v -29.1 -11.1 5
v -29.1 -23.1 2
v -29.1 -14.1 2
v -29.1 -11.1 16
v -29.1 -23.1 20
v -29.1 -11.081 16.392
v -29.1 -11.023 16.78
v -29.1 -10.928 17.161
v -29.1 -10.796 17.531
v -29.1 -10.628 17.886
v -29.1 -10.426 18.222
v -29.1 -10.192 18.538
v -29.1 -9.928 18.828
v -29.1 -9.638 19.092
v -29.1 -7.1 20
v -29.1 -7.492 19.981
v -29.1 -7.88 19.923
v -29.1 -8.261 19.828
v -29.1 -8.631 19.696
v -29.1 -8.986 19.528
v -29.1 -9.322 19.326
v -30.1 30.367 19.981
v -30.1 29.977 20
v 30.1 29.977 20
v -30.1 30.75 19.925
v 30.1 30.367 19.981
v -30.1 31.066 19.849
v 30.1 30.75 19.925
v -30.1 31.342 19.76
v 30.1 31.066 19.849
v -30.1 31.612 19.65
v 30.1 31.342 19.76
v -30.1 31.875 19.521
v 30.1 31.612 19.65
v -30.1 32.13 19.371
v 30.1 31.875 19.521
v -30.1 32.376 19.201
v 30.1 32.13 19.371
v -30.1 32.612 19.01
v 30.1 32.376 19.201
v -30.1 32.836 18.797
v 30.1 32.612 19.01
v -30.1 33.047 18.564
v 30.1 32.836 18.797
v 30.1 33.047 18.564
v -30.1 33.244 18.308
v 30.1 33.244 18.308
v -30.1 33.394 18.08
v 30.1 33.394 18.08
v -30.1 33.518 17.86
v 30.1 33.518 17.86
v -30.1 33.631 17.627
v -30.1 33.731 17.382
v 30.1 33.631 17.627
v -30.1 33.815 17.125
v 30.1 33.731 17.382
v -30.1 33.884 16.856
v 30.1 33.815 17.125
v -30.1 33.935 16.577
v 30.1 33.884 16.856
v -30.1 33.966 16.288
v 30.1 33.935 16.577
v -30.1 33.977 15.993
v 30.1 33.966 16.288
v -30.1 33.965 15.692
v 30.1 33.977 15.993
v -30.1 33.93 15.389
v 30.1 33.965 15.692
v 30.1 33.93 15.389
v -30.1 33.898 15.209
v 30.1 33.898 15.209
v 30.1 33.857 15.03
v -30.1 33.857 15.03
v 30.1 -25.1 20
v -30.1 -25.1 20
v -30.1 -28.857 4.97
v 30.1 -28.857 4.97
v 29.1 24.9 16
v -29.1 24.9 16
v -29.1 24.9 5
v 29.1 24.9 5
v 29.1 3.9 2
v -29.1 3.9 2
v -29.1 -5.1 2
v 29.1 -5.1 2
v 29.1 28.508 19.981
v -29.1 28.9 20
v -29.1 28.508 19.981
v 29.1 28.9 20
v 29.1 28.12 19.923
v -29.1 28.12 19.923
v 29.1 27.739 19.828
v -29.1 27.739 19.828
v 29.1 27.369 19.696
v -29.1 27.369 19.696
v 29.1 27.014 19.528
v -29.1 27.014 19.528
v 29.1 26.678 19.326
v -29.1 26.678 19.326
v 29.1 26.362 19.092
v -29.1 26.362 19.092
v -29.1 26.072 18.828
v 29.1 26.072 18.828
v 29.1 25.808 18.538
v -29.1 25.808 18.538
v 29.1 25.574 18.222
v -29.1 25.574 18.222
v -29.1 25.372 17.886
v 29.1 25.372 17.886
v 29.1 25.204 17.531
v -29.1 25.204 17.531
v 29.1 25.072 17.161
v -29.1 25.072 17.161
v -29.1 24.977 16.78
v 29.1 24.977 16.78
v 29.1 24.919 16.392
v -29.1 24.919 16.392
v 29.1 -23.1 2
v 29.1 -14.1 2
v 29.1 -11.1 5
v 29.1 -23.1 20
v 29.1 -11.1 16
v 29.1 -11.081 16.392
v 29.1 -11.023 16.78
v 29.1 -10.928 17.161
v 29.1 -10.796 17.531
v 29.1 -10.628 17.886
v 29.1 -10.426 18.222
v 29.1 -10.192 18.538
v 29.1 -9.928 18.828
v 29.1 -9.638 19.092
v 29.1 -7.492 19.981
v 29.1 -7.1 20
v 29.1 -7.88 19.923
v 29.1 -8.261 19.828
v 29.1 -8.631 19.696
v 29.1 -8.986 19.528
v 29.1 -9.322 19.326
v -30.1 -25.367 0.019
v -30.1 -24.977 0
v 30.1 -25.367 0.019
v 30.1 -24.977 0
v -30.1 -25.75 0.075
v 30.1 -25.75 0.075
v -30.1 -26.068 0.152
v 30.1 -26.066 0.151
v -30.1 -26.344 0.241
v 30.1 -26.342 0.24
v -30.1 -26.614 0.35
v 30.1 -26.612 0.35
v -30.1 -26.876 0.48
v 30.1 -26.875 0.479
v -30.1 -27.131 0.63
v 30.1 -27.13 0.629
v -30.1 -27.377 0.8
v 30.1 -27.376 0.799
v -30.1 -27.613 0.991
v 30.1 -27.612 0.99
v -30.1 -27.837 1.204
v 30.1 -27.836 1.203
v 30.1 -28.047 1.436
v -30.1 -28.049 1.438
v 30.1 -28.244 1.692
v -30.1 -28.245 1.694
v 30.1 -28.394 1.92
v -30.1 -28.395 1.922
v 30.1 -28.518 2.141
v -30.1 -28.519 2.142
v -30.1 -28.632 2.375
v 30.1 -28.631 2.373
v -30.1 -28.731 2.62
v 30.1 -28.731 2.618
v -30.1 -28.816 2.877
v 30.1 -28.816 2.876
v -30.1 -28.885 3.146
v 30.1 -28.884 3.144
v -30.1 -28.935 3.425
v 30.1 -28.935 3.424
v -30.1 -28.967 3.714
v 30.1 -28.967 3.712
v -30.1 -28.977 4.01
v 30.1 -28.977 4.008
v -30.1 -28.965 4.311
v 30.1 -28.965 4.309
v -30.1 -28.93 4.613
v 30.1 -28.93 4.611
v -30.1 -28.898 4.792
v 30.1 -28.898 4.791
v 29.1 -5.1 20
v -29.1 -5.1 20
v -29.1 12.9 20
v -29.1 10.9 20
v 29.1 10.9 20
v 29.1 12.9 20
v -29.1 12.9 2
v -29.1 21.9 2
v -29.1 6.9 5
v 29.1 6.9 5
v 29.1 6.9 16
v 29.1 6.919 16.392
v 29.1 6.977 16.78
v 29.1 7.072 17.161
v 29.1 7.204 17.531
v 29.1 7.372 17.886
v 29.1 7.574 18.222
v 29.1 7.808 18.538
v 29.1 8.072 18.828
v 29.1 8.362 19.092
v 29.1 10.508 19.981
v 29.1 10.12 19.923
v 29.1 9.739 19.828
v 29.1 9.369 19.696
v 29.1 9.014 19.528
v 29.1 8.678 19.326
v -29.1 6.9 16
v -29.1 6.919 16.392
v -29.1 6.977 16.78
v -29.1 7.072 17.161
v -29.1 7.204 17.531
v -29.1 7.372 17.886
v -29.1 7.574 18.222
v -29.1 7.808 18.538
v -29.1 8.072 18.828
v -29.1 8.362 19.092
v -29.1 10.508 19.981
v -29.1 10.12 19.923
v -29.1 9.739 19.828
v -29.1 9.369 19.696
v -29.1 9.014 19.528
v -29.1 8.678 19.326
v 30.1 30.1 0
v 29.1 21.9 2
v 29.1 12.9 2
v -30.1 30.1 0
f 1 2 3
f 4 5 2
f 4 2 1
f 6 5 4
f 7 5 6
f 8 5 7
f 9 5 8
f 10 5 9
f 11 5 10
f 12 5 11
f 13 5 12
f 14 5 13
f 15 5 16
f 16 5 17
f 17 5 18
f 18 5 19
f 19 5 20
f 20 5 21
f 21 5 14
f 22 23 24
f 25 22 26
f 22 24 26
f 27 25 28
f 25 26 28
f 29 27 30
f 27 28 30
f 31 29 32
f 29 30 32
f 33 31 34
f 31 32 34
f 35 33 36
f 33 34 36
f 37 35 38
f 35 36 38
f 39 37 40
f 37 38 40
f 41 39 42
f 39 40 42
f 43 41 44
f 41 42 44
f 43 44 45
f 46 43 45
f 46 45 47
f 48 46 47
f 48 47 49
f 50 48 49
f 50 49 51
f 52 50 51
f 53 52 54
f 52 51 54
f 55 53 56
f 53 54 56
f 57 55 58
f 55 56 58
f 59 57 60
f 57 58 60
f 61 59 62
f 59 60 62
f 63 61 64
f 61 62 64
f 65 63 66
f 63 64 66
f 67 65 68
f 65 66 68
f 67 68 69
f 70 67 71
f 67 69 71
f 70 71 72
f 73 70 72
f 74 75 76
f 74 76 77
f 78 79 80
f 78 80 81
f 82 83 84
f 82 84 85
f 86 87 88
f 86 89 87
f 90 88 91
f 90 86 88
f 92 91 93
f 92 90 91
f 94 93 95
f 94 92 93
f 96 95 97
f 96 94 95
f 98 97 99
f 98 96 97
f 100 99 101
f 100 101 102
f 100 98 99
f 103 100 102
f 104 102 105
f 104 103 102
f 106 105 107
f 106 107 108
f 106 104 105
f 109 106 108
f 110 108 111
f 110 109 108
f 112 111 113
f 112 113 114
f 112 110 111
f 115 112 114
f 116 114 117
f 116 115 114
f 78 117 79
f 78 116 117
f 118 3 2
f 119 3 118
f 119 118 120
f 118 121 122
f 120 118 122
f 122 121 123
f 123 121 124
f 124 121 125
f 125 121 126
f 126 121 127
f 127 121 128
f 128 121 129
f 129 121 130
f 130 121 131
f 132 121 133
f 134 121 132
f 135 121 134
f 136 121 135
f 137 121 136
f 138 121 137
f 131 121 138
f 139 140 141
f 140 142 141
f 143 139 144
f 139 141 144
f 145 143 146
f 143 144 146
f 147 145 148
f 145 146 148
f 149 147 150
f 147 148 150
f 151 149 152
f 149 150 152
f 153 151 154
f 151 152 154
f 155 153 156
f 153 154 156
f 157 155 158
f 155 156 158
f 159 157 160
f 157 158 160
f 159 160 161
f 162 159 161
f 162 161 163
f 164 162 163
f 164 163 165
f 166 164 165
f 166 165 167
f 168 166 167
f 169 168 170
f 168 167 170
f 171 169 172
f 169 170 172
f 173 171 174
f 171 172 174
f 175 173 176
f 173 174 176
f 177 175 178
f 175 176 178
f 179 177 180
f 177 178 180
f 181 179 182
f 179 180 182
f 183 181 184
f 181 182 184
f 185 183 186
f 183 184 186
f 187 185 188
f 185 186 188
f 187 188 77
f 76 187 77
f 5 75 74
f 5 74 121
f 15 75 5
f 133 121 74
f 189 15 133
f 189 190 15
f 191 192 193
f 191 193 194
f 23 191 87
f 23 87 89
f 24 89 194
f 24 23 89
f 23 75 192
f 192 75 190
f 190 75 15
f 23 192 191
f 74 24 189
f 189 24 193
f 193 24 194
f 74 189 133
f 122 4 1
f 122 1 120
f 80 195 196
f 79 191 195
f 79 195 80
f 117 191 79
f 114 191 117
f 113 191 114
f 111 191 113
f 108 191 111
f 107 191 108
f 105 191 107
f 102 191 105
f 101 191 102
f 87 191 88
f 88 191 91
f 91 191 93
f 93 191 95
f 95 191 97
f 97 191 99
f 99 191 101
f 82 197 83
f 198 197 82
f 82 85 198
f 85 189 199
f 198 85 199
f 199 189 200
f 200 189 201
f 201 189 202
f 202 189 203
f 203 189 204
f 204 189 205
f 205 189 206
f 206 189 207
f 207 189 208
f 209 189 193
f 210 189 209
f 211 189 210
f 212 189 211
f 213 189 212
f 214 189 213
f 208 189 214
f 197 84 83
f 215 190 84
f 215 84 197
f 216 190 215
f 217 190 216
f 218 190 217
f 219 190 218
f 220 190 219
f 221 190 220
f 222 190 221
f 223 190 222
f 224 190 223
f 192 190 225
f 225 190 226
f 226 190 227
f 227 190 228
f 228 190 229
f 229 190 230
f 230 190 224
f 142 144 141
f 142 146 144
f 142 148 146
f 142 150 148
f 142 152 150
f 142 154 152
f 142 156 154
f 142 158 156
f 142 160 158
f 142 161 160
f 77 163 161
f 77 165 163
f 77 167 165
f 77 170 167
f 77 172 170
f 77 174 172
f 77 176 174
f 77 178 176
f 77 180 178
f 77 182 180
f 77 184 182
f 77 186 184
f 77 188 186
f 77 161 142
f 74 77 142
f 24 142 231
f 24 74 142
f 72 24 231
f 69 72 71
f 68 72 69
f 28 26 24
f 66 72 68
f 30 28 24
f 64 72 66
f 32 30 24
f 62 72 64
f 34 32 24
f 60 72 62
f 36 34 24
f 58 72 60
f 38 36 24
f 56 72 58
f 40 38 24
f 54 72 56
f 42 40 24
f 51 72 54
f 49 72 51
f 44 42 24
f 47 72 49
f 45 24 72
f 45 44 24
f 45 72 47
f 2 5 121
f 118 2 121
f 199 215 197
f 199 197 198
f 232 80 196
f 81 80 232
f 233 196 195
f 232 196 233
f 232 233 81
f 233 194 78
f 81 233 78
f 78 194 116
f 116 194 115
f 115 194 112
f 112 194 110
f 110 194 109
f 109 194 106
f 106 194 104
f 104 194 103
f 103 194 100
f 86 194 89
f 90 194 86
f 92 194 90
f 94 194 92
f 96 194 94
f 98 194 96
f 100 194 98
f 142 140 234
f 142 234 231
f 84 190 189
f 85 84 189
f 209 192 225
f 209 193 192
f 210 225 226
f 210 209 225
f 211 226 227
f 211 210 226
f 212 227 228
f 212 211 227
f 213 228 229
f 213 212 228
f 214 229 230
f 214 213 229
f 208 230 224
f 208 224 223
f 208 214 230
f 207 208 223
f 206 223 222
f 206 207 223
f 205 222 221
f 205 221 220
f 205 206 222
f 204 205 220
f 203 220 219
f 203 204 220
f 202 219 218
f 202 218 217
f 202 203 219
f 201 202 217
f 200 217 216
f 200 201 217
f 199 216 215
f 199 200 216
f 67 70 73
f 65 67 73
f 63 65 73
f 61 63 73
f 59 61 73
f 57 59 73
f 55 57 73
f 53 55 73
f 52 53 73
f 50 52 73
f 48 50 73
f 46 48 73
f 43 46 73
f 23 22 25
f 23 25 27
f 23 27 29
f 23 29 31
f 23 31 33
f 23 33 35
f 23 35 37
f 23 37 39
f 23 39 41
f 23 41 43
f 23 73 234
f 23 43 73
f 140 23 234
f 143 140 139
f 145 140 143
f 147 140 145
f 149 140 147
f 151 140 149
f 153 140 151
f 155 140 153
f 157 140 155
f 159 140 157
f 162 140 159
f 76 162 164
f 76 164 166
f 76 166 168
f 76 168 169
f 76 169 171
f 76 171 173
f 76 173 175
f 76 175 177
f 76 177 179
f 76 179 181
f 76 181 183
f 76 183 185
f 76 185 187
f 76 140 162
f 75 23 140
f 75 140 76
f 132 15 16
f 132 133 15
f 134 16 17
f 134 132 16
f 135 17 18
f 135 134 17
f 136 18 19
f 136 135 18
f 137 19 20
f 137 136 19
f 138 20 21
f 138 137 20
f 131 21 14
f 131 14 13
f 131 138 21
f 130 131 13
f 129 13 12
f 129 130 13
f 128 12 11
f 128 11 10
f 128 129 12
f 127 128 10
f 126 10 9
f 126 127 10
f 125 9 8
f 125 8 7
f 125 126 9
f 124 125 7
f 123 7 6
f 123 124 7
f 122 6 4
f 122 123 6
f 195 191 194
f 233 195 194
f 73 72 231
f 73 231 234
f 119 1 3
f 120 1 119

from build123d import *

# Parameters (mm, degrees)
F0_W     = 60.2
F0_H     = 60.2
F2_W     = 60.2
F2_H     = 60.2
F4_W     = 58.2
F4_H     = 12
F5_DEPTH = 18
F6_R     = 4
F7_SIZE  = 3


with BuildPart() as f3:
    # F0 (on Top) → F3 section 0
    with BuildSketch(Plane.XY):
        Rectangle(F0_W, F0_H)
    # F2 (on offset) → F3 section 1
    with BuildSketch(Plane.XY.offset(20)):
        with Locations((0, 5)):
            Rectangle(F2_W, F2_H)
    loft()

    # F4 (on face) → F5 (cut)
    with BuildSketch(Plane.XY.offset(20)):
        with Locations((0, -17.1)):
            Rectangle(F4_W, F4_H)
        with Locations((0, 0.9)):
            Rectangle(F4_W, F4_H)
        with Locations((0, 18.9)):
            Rectangle(F4_W, F4_H)
    extrude(amount=-F5_DEPTH, mode=Mode.SUBTRACT)

    # F6
    f6_edges = [f3.edges().sort_by_distance(p)[0] for p in [
        (0, -30.1, 0),
        (0, 35.1, 20),
        (0, -11.1, 20),
        (0, 6.9, 20),
        (0, 24.9, 20),
    ]]
    fillet(f6_edges, radius=F6_R)

    # F7
    f7_edges = [f3.edges().sort_by_distance(p)[0] for p in [
        (0, 24.9, 2),
        (0, 6.9, 2),
        (0, -11.1, 2),
    ]]
    chamfer(f7_edges, length=F7_SIZE)


solid = f3.part
